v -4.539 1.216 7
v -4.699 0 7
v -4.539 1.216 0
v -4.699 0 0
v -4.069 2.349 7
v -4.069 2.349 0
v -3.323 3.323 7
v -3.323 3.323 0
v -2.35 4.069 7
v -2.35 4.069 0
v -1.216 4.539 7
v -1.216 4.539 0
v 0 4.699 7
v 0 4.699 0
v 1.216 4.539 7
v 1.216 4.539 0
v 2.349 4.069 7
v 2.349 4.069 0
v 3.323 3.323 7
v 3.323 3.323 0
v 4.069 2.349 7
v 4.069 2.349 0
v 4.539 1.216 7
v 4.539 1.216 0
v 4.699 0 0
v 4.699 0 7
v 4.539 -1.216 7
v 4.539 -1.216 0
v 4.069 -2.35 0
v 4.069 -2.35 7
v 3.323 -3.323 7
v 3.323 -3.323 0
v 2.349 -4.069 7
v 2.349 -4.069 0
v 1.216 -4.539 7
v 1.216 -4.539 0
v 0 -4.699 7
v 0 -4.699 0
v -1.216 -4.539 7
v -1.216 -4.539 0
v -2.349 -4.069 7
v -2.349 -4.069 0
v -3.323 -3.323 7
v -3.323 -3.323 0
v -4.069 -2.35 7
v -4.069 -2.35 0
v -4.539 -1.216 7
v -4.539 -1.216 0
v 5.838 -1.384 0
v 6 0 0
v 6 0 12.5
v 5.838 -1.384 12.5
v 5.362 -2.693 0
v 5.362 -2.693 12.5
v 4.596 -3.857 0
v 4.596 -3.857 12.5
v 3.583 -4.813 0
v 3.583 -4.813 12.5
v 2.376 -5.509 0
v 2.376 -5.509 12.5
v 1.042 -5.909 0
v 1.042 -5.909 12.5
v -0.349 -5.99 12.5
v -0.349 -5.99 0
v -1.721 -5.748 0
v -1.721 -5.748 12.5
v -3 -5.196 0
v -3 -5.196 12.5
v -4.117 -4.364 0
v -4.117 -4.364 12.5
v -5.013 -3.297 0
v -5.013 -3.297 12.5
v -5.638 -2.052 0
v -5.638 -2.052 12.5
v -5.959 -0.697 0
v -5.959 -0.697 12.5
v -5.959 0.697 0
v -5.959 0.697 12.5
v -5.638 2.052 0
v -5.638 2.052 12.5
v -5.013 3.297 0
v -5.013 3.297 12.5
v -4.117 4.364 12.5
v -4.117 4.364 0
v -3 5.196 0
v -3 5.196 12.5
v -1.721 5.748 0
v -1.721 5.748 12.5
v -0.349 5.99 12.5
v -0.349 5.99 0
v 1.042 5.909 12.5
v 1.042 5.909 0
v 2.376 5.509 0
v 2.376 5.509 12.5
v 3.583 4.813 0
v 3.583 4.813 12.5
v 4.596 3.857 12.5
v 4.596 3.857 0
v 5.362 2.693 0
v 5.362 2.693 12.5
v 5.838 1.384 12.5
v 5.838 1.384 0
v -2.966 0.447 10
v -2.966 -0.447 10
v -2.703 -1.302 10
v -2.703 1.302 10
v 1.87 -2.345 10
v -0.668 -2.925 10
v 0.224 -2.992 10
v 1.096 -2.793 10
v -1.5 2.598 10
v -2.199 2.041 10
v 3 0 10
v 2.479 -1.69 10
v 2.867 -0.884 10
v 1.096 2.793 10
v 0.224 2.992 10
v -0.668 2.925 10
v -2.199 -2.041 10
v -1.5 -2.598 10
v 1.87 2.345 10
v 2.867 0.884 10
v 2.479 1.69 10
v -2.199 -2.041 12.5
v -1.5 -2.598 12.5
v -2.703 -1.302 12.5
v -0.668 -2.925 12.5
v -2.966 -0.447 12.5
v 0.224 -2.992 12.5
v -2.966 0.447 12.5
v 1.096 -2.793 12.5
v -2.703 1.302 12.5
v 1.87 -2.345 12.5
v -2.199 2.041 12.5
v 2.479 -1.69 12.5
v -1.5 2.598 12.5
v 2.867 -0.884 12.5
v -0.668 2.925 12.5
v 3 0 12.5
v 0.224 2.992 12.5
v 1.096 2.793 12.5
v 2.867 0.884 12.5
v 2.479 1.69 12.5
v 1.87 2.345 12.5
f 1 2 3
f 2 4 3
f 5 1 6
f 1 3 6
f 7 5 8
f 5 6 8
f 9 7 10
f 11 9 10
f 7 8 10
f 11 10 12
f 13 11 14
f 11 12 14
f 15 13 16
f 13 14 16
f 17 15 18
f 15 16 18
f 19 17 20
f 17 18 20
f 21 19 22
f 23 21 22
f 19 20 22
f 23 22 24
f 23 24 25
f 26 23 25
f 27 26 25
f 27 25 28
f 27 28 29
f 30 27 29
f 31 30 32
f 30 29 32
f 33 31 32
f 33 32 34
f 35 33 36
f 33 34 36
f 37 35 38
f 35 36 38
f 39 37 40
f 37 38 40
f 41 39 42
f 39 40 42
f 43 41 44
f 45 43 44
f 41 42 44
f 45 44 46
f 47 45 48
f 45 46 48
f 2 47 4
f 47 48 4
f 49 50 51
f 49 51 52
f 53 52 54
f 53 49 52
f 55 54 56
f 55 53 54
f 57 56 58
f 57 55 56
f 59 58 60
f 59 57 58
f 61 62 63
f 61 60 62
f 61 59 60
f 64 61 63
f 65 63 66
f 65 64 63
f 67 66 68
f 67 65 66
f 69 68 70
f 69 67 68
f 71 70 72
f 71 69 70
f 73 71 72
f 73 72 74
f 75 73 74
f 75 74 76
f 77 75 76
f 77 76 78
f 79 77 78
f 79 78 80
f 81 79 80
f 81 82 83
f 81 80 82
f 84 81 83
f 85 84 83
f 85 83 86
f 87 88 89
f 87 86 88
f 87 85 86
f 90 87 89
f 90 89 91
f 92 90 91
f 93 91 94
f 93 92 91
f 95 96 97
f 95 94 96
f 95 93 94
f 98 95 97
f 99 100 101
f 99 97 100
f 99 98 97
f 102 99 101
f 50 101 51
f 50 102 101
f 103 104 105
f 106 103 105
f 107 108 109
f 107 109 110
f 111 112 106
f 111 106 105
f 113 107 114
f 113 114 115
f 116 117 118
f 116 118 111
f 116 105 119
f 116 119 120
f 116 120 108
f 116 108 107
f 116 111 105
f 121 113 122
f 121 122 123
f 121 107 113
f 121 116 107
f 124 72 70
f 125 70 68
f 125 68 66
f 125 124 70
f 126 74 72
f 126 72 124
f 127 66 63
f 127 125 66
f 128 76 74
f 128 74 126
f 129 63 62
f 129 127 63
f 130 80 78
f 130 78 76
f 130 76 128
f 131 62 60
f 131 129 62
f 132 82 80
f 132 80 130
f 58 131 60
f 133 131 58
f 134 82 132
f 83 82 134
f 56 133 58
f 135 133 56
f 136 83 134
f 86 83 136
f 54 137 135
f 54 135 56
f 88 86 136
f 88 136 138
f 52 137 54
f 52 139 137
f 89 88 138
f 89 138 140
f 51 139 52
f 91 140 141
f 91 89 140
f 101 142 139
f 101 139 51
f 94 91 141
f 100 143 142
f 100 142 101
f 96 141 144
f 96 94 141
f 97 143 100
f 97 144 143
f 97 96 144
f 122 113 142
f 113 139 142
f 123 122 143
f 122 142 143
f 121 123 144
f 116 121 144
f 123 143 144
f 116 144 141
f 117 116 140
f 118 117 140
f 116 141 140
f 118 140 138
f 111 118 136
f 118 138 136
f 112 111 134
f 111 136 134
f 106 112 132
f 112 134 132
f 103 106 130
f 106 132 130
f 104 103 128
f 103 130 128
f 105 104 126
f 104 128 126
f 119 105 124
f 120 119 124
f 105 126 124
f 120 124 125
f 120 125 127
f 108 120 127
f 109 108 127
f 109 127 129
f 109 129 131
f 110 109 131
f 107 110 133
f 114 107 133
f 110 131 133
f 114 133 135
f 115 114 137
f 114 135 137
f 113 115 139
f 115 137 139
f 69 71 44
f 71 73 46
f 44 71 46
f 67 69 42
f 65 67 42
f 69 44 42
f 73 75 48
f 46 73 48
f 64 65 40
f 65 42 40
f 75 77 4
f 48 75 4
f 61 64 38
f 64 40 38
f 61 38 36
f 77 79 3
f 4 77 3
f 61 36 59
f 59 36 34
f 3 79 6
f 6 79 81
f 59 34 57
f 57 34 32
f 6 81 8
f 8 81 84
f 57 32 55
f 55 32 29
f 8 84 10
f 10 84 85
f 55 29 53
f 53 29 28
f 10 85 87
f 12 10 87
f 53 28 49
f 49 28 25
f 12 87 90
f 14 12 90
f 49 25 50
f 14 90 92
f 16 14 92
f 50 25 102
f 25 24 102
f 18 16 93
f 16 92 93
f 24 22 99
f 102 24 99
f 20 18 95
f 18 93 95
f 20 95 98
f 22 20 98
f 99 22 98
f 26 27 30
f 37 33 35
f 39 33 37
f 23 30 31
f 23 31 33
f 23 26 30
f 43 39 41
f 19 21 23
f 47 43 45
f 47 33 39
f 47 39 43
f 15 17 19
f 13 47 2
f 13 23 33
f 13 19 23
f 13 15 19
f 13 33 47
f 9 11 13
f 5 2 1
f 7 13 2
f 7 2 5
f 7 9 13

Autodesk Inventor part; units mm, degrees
ref_plane "YZ Plane" through (0, 0, 0) normal (1, 0, 0) x (0, 1, 0)
ref_plane "XZ Plane" through (0, 0, 0) normal (0, 1, 0) x (-1, 0, 0)
ref_plane "XY Plane" through (0, 0, 0) normal (0, 0, 1) x (1, 0, 0)
sketch "Sketch1" plane through (0, 0, 0) normal (0, 0, 1) x (1, 0, 0)
  circle A0 centre (0, 0) radius 6
  dimension "d0" = 12
extrude "Extrusion1" add sketch "Sketch1" along normal blind 15
sketch "Sketch2" plane through (0, 0, 0) normal (0, 0, -1) x (-1, 0, 0)
  circle A0 centre (0, 0) radius 6 projected
  circle A1 centre (0, 0) radius 4.699
  dimension "d3" = 9.398
extrude "Extrusion2" cut sketch "Sketch2" against normal blind 7 contours A1
sketch "Sketch3" plane through (0, 0, 15) normal (0, 0, 1) x (1, 0, 0)
  circle A0 centre (0, 0) radius 6 projected
  circle A1 centre (0, 0) radius 3
  dimension "d6" = 6
extrude "Extrusion3" cut sketch "Sketch3" against normal blind 2.5 contours A1
sketch "Sketch4" plane through (0, 0, 15) normal (0, 0, 1) x (1, 0, 0)
  circle A0 centre (0, 0) radius 3 projected
  circle A1 centre (0, 0) radius 6 projected
extrude "Extrusion4" add sketch "Sketch4" along normal blind 15
sketch "Sketch5" plane through (0, 0, 12.5) normal (0, 0, 1) x (1, 0, 0)
  circle A0 centre (0, 0) radius 3 projected
extrude "Extrusion5" add sketch "Sketch5" along normal blind 15
sketch "Sketch6" plane through (0, 0, 30) normal (0, 0, 1) x (1, 0, 0)
  circle A0 centre (0, 0) radius 3 projected
  circle A1 centre (0, 0) radius 6 projected
extrude "Extrusion6" cut sketch "Sketch6" against normal blind 17.5
sketch "Sketch7" plane through (0, 0, 27.5) normal (0, 0, 1) x (1, 0, 0)
  circle A0 centre (0, 0) radius 3 projected
extrude "Extrusion7" cut sketch "Sketch7" against normal blind 17.5
properties part number "Shaft Cap" material "ABS Plastic"
